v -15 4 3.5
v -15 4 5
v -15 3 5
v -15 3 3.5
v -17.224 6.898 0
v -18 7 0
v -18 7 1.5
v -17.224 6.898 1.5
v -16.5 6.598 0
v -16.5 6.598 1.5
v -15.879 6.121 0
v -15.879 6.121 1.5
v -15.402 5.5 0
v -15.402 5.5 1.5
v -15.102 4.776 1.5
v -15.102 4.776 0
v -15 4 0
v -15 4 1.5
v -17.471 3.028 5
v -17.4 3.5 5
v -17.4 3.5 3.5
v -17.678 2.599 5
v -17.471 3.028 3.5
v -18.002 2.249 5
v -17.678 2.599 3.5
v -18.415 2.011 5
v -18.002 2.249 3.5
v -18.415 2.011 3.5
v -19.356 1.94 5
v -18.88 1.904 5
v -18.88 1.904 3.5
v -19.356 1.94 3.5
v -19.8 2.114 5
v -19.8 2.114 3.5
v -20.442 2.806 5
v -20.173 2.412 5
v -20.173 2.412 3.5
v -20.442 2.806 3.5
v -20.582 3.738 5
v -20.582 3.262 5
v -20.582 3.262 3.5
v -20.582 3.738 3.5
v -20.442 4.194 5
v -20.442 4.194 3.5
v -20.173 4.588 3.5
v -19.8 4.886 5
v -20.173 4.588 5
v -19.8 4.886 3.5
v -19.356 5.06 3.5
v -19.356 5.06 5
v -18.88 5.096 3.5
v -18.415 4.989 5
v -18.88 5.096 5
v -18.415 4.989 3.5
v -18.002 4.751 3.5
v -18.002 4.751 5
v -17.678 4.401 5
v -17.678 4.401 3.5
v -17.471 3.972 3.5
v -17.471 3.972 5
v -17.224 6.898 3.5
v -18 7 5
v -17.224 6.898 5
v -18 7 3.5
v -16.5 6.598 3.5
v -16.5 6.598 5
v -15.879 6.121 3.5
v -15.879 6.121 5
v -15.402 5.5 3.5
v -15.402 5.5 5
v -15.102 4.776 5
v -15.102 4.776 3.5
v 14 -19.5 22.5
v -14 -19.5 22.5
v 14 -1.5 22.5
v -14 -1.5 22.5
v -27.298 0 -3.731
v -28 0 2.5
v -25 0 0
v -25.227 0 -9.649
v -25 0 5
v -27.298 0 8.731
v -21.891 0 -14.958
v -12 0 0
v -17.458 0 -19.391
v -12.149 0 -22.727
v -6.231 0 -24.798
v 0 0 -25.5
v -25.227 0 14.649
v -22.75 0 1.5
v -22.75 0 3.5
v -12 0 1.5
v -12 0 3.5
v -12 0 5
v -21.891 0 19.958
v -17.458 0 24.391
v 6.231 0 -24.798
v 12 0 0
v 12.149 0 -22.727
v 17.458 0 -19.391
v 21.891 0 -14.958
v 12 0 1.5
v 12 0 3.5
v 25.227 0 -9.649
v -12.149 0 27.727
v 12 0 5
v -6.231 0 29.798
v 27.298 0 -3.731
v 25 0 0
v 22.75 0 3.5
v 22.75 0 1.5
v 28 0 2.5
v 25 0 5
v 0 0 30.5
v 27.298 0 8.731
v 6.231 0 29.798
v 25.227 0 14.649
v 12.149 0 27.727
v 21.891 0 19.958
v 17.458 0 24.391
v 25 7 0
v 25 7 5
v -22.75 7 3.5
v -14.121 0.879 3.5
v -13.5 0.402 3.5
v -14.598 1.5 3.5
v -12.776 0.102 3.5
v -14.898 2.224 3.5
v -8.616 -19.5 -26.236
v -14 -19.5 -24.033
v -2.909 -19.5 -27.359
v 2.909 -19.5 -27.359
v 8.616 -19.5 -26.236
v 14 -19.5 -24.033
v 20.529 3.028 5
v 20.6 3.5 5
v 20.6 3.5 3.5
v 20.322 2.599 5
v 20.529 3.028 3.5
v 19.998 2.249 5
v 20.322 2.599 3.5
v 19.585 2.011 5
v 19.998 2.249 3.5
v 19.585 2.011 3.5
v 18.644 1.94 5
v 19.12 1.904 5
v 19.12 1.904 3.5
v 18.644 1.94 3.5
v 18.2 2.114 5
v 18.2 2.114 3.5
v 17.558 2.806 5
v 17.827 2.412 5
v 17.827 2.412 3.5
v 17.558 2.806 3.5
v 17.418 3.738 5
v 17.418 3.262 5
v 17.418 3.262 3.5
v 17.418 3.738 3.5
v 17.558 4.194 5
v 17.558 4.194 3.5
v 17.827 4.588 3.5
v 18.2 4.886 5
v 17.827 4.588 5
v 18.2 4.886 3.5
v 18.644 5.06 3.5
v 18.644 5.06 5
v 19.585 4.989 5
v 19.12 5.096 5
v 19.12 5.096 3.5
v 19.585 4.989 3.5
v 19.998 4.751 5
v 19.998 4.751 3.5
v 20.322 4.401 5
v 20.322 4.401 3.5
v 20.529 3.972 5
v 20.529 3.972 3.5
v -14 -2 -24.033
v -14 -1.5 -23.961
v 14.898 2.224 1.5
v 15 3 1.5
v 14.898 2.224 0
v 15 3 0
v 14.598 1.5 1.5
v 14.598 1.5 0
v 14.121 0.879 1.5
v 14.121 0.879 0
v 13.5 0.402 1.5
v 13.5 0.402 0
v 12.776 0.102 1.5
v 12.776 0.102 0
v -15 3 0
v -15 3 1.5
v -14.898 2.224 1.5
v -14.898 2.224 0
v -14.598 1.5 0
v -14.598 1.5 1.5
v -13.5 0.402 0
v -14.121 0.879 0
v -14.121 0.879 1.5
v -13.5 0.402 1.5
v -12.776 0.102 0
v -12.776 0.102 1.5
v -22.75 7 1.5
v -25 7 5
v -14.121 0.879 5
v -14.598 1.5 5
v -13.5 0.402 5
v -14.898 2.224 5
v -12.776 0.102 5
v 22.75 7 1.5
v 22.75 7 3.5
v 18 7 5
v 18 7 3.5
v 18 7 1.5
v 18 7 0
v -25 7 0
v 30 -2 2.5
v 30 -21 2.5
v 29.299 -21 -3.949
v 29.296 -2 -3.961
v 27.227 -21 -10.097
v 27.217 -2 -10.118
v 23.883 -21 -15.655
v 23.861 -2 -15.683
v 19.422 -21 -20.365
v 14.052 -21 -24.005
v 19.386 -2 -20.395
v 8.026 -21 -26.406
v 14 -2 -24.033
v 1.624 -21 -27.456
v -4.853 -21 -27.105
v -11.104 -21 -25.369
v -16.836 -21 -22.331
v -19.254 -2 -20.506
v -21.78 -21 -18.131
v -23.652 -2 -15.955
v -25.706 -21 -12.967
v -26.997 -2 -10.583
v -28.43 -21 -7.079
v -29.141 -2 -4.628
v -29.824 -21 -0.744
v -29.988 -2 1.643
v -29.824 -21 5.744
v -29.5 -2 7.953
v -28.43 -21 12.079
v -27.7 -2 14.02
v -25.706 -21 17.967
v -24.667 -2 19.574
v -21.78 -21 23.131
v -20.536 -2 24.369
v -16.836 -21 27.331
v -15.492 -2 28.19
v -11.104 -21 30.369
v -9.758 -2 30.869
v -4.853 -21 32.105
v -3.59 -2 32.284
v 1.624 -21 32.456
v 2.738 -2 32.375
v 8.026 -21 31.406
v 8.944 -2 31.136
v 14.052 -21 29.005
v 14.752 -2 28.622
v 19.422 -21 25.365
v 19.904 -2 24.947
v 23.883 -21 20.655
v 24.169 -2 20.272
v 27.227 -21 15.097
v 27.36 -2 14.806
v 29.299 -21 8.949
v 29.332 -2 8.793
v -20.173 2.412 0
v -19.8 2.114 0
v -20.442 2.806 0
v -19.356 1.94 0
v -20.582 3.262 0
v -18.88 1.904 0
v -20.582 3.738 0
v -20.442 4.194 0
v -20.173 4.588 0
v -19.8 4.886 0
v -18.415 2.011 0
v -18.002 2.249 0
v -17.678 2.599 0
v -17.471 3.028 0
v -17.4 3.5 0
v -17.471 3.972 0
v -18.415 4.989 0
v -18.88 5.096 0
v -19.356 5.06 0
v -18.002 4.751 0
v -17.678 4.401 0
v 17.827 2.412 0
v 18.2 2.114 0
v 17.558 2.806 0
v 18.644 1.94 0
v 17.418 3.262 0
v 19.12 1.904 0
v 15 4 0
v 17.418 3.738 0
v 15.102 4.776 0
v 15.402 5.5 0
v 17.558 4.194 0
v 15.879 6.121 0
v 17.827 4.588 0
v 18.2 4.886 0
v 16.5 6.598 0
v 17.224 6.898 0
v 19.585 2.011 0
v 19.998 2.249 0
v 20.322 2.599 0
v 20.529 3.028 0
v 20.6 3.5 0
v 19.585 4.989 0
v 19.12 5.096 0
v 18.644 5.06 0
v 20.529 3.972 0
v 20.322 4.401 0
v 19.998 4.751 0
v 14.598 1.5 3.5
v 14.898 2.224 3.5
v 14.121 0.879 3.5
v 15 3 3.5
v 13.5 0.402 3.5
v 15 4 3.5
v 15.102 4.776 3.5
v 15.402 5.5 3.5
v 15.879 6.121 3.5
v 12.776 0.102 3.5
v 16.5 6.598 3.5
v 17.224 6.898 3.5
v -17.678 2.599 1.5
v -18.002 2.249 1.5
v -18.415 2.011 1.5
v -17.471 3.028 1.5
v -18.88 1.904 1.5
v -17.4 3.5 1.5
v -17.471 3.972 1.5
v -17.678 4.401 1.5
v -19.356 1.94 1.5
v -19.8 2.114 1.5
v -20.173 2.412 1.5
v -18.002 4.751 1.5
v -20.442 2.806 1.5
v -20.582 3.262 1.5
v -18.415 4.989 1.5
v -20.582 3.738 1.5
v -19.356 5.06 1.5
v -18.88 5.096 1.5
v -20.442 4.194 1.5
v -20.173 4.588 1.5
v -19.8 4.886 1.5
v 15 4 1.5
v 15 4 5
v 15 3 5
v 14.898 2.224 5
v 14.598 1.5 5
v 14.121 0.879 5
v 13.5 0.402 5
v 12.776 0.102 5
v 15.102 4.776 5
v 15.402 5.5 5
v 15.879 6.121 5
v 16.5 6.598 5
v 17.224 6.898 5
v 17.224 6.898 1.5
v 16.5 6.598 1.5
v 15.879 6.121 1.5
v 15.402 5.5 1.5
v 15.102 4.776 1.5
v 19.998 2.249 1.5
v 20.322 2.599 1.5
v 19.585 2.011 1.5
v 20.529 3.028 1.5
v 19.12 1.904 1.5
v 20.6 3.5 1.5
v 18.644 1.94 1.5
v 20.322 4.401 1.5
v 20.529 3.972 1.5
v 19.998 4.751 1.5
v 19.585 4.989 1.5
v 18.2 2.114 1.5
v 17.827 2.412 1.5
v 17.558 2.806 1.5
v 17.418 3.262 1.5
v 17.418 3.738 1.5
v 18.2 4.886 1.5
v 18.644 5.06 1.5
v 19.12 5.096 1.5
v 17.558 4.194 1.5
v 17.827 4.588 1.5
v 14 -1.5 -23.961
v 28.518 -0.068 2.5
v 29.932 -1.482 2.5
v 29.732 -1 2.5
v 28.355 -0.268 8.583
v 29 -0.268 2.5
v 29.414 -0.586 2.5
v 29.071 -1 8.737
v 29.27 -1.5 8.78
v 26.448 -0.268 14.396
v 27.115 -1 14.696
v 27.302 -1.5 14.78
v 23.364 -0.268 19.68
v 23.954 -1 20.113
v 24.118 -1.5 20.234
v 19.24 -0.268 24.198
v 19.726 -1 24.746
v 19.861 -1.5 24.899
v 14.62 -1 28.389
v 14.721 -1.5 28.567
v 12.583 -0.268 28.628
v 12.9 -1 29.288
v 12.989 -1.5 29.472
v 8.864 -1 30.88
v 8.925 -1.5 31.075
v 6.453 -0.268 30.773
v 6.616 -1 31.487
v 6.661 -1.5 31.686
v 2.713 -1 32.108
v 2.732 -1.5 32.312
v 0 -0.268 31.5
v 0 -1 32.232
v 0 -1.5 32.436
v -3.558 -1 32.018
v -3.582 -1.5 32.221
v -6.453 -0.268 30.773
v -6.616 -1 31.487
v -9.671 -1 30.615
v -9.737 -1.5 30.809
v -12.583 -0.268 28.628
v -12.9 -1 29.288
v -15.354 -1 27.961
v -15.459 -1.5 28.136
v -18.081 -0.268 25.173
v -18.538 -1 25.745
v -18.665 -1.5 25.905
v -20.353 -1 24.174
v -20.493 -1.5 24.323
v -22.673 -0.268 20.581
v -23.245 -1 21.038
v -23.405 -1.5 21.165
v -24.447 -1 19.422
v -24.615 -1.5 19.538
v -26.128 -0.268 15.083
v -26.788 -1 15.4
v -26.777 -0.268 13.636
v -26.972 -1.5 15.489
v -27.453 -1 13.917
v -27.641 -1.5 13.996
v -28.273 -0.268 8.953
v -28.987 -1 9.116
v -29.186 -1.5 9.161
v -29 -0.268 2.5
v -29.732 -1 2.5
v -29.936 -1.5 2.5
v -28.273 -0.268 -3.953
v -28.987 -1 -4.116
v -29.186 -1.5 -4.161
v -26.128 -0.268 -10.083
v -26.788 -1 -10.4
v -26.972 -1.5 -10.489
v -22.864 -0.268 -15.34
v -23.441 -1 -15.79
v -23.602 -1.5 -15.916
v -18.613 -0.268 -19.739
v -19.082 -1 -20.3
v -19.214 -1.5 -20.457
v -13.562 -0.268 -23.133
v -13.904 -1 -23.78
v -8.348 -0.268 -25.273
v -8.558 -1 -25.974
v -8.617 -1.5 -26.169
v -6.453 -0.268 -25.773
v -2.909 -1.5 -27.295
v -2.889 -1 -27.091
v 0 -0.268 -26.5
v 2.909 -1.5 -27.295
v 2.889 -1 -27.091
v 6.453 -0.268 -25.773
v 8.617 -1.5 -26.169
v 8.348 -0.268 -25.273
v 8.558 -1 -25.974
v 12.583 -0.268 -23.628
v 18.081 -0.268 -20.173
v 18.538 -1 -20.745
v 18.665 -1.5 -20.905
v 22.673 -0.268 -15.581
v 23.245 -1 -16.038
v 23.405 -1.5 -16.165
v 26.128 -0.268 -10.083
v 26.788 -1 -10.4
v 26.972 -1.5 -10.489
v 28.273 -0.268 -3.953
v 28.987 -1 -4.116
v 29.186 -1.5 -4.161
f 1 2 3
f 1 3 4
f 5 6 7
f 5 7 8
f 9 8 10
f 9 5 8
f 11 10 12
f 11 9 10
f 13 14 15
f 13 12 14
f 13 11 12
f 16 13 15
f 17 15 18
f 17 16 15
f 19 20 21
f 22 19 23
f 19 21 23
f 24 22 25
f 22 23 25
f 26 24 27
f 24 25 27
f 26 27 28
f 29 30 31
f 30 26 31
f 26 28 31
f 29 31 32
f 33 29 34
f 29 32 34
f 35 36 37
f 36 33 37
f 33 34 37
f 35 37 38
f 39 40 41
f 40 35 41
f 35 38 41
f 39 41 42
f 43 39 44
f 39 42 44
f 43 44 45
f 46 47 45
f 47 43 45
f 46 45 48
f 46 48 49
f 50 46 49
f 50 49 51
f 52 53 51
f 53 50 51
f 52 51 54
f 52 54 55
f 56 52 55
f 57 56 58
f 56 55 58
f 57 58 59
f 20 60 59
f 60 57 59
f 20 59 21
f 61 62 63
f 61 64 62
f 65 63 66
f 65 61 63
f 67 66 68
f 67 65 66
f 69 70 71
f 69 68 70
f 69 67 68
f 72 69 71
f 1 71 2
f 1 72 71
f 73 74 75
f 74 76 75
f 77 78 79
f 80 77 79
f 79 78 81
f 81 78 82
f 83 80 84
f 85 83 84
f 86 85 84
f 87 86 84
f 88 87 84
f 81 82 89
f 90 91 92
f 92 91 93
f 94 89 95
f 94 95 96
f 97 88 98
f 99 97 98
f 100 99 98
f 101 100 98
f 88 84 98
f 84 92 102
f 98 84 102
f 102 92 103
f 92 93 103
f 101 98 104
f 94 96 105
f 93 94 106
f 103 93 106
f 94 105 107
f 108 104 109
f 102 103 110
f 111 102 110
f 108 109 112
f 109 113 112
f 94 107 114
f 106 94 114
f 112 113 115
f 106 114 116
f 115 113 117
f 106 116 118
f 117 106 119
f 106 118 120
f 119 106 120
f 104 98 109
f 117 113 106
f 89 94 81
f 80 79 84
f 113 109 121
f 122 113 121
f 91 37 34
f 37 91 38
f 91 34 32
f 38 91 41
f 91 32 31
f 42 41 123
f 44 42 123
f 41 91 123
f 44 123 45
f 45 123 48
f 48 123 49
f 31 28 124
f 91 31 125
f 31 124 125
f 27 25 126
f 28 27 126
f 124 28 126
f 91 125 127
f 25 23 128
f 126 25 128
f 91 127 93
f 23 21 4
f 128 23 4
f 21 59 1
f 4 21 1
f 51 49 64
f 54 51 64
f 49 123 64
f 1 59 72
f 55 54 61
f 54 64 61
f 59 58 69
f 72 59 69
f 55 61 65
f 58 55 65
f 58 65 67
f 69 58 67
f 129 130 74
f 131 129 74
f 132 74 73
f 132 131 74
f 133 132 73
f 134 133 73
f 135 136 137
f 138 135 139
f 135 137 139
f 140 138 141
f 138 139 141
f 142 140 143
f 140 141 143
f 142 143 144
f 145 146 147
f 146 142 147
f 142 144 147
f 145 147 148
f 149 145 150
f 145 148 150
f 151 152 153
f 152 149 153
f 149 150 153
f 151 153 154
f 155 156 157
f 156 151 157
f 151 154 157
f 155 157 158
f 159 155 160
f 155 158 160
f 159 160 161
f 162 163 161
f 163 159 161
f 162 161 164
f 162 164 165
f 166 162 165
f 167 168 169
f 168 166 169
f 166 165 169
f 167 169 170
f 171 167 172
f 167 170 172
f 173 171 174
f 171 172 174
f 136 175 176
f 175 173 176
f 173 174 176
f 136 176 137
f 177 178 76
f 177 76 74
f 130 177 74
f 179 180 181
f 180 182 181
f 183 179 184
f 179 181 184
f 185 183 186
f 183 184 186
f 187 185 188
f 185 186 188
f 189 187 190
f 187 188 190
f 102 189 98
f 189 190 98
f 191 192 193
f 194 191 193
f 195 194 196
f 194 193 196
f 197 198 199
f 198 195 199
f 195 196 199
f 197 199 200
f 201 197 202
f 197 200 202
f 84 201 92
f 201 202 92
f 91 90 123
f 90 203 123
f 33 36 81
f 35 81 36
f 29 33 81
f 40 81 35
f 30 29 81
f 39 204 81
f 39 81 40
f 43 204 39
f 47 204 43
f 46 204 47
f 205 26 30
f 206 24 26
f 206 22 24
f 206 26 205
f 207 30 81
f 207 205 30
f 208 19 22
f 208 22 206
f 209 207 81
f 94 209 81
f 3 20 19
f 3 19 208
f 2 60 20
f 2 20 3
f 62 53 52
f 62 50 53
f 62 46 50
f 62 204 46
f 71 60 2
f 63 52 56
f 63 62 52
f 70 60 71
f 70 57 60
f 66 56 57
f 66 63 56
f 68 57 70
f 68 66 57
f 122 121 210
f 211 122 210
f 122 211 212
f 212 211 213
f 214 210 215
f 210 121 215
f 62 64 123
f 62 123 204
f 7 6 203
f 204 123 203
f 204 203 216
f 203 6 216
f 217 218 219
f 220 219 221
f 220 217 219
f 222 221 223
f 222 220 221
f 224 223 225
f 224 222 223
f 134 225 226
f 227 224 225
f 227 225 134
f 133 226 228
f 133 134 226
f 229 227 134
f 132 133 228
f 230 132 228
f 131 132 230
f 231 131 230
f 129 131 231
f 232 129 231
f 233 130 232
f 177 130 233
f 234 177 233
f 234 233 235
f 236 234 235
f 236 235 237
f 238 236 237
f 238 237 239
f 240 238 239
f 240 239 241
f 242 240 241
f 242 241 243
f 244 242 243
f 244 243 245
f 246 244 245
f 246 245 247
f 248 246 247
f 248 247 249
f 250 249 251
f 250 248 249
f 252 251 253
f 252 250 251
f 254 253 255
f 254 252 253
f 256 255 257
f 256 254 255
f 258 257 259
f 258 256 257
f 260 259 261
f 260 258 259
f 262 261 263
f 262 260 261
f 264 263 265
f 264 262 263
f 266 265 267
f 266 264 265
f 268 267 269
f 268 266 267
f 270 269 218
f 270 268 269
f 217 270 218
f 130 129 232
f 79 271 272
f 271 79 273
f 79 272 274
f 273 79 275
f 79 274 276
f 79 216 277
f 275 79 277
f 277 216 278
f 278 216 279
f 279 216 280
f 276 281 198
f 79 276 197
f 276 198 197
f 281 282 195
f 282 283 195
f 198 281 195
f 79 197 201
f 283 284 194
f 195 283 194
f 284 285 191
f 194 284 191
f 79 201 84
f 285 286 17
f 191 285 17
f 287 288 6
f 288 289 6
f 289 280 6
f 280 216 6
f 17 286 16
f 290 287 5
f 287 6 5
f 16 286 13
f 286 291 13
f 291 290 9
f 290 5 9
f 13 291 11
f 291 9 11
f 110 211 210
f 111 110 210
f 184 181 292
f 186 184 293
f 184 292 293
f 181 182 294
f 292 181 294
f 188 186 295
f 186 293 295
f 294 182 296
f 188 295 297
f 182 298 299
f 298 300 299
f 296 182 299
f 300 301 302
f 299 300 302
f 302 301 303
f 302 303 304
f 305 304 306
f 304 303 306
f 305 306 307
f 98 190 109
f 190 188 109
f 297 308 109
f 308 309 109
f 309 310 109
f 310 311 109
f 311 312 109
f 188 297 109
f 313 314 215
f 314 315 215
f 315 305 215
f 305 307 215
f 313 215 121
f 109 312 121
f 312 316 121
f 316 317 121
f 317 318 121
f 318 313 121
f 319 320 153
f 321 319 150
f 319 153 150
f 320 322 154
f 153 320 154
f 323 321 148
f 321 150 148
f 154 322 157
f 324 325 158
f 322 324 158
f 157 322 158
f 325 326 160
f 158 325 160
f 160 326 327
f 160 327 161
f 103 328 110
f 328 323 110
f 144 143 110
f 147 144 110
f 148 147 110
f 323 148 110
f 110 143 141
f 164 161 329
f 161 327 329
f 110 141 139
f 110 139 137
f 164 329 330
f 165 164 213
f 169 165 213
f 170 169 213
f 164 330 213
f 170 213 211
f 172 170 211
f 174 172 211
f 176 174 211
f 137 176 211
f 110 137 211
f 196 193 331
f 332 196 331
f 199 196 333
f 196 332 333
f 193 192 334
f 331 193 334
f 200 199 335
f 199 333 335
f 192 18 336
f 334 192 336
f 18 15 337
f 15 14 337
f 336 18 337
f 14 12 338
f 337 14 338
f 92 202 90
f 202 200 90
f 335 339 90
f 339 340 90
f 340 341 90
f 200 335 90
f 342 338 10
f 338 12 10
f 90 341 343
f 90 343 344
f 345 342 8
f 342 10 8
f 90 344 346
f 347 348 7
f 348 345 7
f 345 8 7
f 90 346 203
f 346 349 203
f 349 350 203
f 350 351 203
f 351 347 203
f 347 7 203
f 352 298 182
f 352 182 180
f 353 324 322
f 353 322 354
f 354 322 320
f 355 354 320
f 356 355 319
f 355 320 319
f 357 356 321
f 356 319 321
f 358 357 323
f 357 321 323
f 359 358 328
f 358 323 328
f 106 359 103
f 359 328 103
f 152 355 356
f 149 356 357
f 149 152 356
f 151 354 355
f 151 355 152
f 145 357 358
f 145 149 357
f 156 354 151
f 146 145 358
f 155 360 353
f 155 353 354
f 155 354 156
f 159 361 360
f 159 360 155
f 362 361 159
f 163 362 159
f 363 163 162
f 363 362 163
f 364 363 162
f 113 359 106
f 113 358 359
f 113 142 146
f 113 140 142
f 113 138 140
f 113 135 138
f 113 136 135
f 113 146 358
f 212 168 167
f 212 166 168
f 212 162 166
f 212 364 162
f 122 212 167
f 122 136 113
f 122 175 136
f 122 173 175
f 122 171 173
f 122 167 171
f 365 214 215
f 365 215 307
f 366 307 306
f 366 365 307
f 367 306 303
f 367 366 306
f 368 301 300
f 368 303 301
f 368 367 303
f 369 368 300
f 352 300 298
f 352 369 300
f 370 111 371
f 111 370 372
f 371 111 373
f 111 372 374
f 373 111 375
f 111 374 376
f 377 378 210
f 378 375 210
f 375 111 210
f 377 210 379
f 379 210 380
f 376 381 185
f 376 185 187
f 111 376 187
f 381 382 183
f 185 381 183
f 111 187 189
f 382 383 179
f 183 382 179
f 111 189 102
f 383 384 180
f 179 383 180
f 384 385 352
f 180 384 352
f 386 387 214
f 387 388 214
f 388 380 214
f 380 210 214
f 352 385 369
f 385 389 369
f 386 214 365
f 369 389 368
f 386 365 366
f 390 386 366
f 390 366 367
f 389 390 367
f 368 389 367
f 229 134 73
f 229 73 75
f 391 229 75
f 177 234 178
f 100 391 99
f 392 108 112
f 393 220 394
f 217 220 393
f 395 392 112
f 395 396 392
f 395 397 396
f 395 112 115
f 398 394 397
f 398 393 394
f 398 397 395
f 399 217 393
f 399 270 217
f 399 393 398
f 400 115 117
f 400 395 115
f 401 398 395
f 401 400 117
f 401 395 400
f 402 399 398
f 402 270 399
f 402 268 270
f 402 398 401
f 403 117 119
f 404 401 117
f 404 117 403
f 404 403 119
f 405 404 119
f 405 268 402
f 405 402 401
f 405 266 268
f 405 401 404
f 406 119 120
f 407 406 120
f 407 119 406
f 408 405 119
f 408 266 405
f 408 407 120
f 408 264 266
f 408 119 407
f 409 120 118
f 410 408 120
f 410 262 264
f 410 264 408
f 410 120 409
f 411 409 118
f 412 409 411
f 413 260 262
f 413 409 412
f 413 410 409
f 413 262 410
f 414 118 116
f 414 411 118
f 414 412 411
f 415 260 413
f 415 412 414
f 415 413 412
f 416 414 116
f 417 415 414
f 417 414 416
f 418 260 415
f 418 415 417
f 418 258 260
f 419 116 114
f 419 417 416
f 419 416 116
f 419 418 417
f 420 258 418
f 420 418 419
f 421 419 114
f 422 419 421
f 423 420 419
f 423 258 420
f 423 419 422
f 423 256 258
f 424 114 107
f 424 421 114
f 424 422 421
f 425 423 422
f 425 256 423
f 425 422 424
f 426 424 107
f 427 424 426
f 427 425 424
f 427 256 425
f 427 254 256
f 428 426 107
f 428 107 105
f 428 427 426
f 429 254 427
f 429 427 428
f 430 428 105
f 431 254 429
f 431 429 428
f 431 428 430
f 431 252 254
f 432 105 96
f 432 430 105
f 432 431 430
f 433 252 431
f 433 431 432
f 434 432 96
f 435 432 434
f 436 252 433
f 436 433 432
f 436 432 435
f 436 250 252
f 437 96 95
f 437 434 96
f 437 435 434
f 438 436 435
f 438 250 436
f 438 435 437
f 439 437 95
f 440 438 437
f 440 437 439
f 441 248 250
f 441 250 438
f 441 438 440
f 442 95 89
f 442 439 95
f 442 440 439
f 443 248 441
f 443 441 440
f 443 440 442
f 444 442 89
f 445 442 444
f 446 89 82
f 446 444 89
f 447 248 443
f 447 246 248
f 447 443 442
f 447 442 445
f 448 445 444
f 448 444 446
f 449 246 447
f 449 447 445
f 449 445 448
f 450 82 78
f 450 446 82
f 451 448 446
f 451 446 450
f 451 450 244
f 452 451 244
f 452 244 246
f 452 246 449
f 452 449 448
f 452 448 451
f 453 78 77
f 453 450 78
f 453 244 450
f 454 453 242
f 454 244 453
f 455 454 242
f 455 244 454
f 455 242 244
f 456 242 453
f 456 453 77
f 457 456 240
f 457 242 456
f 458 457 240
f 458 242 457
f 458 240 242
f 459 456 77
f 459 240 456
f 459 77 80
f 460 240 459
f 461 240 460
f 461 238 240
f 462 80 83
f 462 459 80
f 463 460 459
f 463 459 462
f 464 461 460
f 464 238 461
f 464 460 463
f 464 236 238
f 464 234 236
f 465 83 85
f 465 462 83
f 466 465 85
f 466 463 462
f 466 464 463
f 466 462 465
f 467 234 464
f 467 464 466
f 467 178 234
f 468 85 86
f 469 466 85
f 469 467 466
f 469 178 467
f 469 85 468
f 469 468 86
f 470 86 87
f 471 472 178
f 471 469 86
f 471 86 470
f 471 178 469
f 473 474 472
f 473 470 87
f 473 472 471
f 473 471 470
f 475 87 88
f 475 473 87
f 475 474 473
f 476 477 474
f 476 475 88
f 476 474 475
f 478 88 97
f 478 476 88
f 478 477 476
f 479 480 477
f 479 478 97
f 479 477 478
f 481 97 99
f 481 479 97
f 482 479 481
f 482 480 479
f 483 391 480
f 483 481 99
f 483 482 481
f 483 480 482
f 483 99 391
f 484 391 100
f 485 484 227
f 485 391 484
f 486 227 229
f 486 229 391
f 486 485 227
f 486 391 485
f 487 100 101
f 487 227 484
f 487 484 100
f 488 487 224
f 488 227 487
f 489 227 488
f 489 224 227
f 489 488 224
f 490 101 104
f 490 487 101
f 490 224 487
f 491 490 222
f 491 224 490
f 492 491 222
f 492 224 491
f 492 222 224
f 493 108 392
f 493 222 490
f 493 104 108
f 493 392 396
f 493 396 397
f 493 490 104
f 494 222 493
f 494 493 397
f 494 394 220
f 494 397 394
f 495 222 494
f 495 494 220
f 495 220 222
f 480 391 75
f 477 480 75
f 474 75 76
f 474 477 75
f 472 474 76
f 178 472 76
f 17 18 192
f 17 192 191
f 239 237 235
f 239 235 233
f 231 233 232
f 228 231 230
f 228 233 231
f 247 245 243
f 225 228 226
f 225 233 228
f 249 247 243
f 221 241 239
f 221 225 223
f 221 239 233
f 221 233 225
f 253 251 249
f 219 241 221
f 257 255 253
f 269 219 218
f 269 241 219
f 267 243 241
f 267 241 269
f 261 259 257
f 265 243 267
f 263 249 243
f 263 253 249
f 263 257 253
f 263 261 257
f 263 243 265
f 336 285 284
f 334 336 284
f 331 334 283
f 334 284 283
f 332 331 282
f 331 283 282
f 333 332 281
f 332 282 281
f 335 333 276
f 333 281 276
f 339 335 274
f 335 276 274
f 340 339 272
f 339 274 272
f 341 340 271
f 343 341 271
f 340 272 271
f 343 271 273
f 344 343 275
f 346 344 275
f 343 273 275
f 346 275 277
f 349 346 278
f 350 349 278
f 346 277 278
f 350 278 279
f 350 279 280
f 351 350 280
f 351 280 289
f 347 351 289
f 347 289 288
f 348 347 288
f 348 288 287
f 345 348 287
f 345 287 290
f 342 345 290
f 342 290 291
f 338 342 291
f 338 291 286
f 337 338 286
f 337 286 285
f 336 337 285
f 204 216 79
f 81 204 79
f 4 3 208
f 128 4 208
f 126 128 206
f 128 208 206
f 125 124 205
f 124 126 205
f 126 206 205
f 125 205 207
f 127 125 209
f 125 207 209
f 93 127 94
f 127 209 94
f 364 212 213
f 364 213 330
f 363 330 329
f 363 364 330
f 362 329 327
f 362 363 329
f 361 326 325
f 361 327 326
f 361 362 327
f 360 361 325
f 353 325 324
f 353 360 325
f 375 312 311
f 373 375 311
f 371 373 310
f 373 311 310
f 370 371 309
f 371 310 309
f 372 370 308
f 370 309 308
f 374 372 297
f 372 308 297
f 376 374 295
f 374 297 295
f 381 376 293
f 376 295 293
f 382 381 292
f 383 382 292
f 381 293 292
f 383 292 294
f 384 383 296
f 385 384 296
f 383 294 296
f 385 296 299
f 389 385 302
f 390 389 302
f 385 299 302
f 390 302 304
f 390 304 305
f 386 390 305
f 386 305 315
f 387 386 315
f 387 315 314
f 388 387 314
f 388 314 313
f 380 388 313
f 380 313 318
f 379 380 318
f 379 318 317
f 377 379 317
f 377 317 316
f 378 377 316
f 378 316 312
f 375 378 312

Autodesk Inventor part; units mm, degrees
ref_plane "Work Plane2" through (0, 0, 32.5) normal (0, 0, 1) x (1, 0, 0)
ref_plane "YZ Plane" through (0, 0, 0) normal (1, 0, 0) x (0, 1, 0)
sketch "Sketch1" plane through (0, 0, 0) normal (0, 0, 1) x (1, 0, 0)
  line L0 (25, 7) -> (-25, 7)
  line L1 (-25, 7) -> (-25, 0)
  line L2 (-25, 0) -> (25, 0)
  line L3 (25, 0) -> (25, 7)
  circle A0 centre (-19, 3.5) radius 1.6
  circle A1 centre (19, 3.5) radius 1.6
  line L4 (19, 3.5) -> (-19, 3.5) construction
  line L5 (19, 3.5) -> (25, 7) construction
  line L6 (19, 3.5) -> (25, 0) construction
  line L7 (-19, 3.5) -> (-25, 7) construction
  line L8 (-19, 3.5) -> (-25, 0) construction
  line L9 (0, 0) -> (-19, 3.5) construction
  line L10 (0, 0) -> (19, 3.5) construction
  dimension "d0" = 3.2
  dimension "d1" = 38
  dimension "d2" = 7
  dimension "d3" = 50
extrude "Extrusion1" add sketch "Sketch1" along normal blind 5
sketch "Sketch2" plane through (-25, 7, 0) normal (0, 1, 0) x (1, 0, 0)
  line L0 (2.25, -3.5) -> (10, -3.5)
  line L1 (47.75, -3.5) -> (47.75, -1.5)
  line L2 (47.75, -1.5) -> (40, -1.5)
  line L3 (2.25, -1.5) -> (2.25, -3.5)
  line L4 (50, -5) -> (0, -5) construction
  line L5 (0, -5) -> (2.25, -3.5) construction
  line L6 (50, 0) -> (0, 0) construction
  line L7 (2.25, -1.5) -> (0, 0) construction
  line L8 (50, 0) -> (50, -5) construction
  line L9 (47.75, -3.5) -> (50, -5) construction
  line L10 (40, -3.5) -> (40, -5)
  line L11 (40, -5) -> (10, -5)
  line L12 (10, -5) -> (10, -3.5)
  line L13 (10, -1.5) -> (10, 0)
  line L14 (10, 0) -> (40, 0)
  line L15 (40, 0) -> (40, -1.5)
  line L16 (40, -3.5) -> (47.75, -3.5)
  line L17 (40, -1.5) -> (10, -1.5) construction
  line L18 (10, -3.5) -> (40, -3.5) construction
  line L19 (10, -1.5) -> (2.25, -1.5)
  line L20 (47.75, -3.5) -> (40, -5) construction
  line L21 (40, 0) -> (47.75, -1.5) construction
  line L22 (10, -5) -> (2.25, -3.5) construction
  line L23 (2.25, -1.5) -> (10, 0) construction
  point P0 (25, 0)
  dimension "d6" = 45.5
  dimension "d7" = 2
  dimension "d13" = 30
extrude "Extrusion2" cut sketch "Sketch2" against normal up to next
sketch "Sketch3" plane through (-25, 0, 0) normal (0, -1, 0) x (1, 0, 0)
  circle A0 centre (25, 2.5) radius 30
  line L0 (0, 5) -> (50, 5) construction
  line L1 (0, 5) -> (25, 2.5) construction
  line L2 (0, 0) -> (50, 0) construction
  line L3 (25, 2.5) -> (0, 0) construction
  line L4 (25, 2.5) -> (50, 5) construction
  point P0 (25, 0)
  dimension "d10" = 60
extrude "Extrusion3" add sketch "Sketch3" along normal blind 21
ref_plane "Work Plane1" through (0, 0, -27.5) normal (0, 0, 1) x (1, 0, 0)
sketch "Sketch5" plane through (0, 0, -27.5) normal (0, 0, 1) x (1, 0, 0)
  line L0 (14, -1.5) -> (-14, -1.5)
  line L1 (-14, -1.5) -> (-14, -19.5)
  line L2 (-14, -19.5) -> (14, -19.5)
  line L3 (14, -19.5) -> (14, -1.5)
  line L4 (-30, -21) -> (30, -21) construction
  line L5 (30, 0) -> (-30, 0) construction
  line L6 (30, 0) -> (-30, 0) construction
  line L7 (30, 0) -> (14, -1.5) construction
  line L8 (-14, -1.5) -> (-30, 0) construction
  line L9 (-30, -21) -> (30, -21) construction
  line L10 (-30, -21) -> (-14, -19.5) construction
  point P0 (0, 0)
  dimension "d16" = 18
  dimension "d17" = 28
extrude "Extrusion4" cut sketch "Sketch5" along normal blind 50
fillet "Fillet1" radius 3 8 edges at (15, 7, 0.75) (15, 7, 4.25) (15, 0, 4.25) (15, 0, 0.75) (-15, 0, 0.75) (-15, 7, 0.75) (-15, 7, 4.25) (-15, 0, 4.25)
fillet "Fillet2" radius 2 1 edges at (-30, 0, 2.5)
sketch "Sketch7" plane through (0, 0, 32.5) normal (0, 0, 1) x (1, 0, 0)
  spline S0 degree 3 poles (3.6755, -17.8887) (1.3417, -19.2361) (-1.5336, -19.2361) (-3.8674, -17.8887) knots 0 0 0 0 1 1 1 1
  line L0 (3.6755, -17.8887) -> (1.3417, -19.2361) construction
  line L1 (1.3417, -19.2361) -> (-1.5336, -19.2361) construction
  line L2 (-1.5336, -19.2361) -> (-3.8674, -17.8887) construction
  spline S1 degree 3 poles (-3.8674, -17.8887) (-6.2011, -16.5413) (-7.6388, -14.0512) (-7.6388, -11.3564) knots 0 0 0 0 1 1 1 1
  line L3 (-3.8674, -17.8887) -> (-6.2011, -16.5413) construction
  line L4 (-6.2011, -16.5413) -> (-7.6388, -14.0512) construction
  line L5 (-7.6388, -14.0512) -> (-7.6388, -11.3564) construction
  spline S2 degree 3 poles (-7.6388, -11.3564) (-7.6388, -8.6616) (-6.2011, -6.1715) (-3.8674, -4.8241) knots 0 0 0 0 1 1 1 1
  line L6 (-7.6388, -11.3564) -> (-7.6388, -8.6616) construction
  line L7 (-7.6388, -8.6616) -> (-6.2011, -6.1715) construction
  line L8 (-6.2011, -6.1715) -> (-3.8674, -4.8241) construction
  spline S3 degree 3 poles (-3.8674, -4.8241) (-1.5336, -3.4767) (1.3417, -3.4767) (3.6755, -4.8241) knots 0 0 0 0 1 1 1 1
  line L9 (-3.8674, -4.8241) -> (-1.5336, -3.4767) construction
  line L10 (-1.5336, -3.4767) -> (1.3417, -3.4767) construction
  line L11 (1.3417, -3.4767) -> (3.6755, -4.8241) construction
  spline S4 degree 3 poles (3.6755, -4.8241) (6.0092, -6.1715) (7.4469, -8.6616) (7.4469, -11.3564) knots 0 0 0 0 1 1 1 1
  line L12 (3.6755, -4.8241) -> (6.0092, -6.1715) construction
  line L13 (6.0092, -6.1715) -> (7.4469, -8.6616) construction
  line L14 (7.4469, -8.6616) -> (7.4469, -11.3564) construction
  spline S5 degree 3 poles (7.4469, -11.3564) (7.4469, -14.0512) (6.0092, -16.5413) (3.6755, -17.8887) knots 0 0 0 0 1 1 1 1
  line L15 (7.4469, -11.3564) -> (7.4469, -14.0512) construction
  line L16 (7.4469, -14.0512) -> (6.0092, -16.5413) construction
  line L17 (6.0092, -16.5413) -> (3.6755, -17.8887) construction
  spline S6 degree 3 poles (-0.623, -14.5187) (-0.623, -14.5201) (-0.623, -15.9241) (-2.0285, -15.9241) knots 0 0 0 0 1 1 1 1
  line L18 (-0.623, -14.5187) -> (-0.623, -14.5187) construction
  line L19 (-0.623, -14.5187) -> (-0.623, -15.9241) construction
  line L20 (-0.623, -15.9241) -> (-2.0285, -15.9241) construction
  spline S7 degree 3 poles (-2.0285, -15.9241) (-3.4339, -15.9241) (-3.4339, -14.5201) (-3.4339, -14.5187) knots 0 0 0 0 1 1 1 1
  line L21 (-2.0285, -15.9241) -> (-3.4339, -15.9241) construction
  line L22 (-3.4339, -15.9241) -> (-3.4339, -14.5187) construction
  line L23 (-3.4339, -14.5187) -> (-3.4339, -14.5187) construction
  line L24 (-0.623, -5.7345) -> (-0.623, -14.5187)
  spline S8 degree 3 poles (-4.488, -14.5187) (-4.488, -14.5211) (-4.488, -16.9782) (-2.0285, -16.9782) knots 0 0 0 0 1 1 1 1
  line L25 (-4.488, -14.5187) -> (-4.488, -14.5187) construction
  line L26 (-4.488, -14.5187) -> (-4.488, -16.9782) construction
  line L27 (-4.488, -16.9782) -> (-2.0285, -16.9782) construction
  spline S9 degree 3 poles (-2.0285, -16.9782) (0.4311, -16.9782) (0.4311, -14.5211) (0.4311, -14.5187) knots 0 0 0 0 1 1 1 1
  line L28 (-2.0285, -16.9782) -> (0.4311, -16.9782) construction
  line L29 (0.4311, -16.9782) -> (0.4311, -14.5187) construction
  line L30 (0.4311, -14.5187) -> (0.4311, -14.5187) construction
  line L31 (-3.4339, -14.5187) -> (-4.488, -14.5187)
  spline S10 degree 3 poles (1.8366, -14.5187) (1.839, -14.5187) (4.2961, -14.5187) (4.2961, -12.0591) knots 0 0 0 0 1 1 1 1
  line L32 (1.8366, -14.5187) -> (1.8366, -14.5187) construction
  line L33 (1.8366, -14.5187) -> (4.2961, -14.5187) construction
  line L34 (4.2961, -14.5187) -> (4.2961, -12.0591) construction
  spline S11 degree 3 poles (4.2961, -12.0591) (4.2961, -11.0712) (3.8992, -10.4803) (3.4243, -10.1266) knots 0 0 0 0 1 1 1 1
  line L35 (4.2961, -12.0591) -> (4.2961, -11.0712) construction
  line L36 (4.2961, -11.0712) -> (3.8992, -10.4803) construction
  line L37 (3.8992, -10.4803) -> (3.4243, -10.1266) construction
  spline S12 degree 3 poles (3.4243, -10.1266) (3.8992, -9.7729) (4.2961, -9.182) (4.2961, -8.1941) knots 0 0 0 0 1 1 1 1
  line L38 (3.4243, -10.1266) -> (3.8992, -9.7729) construction
  line L39 (3.8992, -9.7729) -> (4.2961, -9.182) construction
  line L40 (4.2961, -9.182) -> (4.2961, -8.1941) construction
  spline S13 degree 3 poles (4.2961, -8.1941) (4.2961, -5.7345) (1.839, -5.7345) (1.8366, -5.7345) knots 0 0 0 0 1 1 1 1
  line L41 (4.2961, -8.1941) -> (4.2961, -5.7345) construction
  line L42 (4.2961, -5.7345) -> (1.8366, -5.7345) construction
  line L43 (1.8366, -5.7345) -> (1.8366, -5.7345) construction
  line L44 (0.4311, -14.5187) -> (1.8366, -14.5187)
  line L45 (1.8366, -5.7345) -> (-0.623, -5.7345)
  spline S14 degree 3 poles (1.8366, -6.7886) (1.838, -6.7886) (3.242, -6.7886) (3.242, -8.1941) knots 0 0 0 0 1 1 1 1
  line L46 (1.8366, -6.7886) -> (1.8366, -6.7886) construction
  line L47 (1.8366, -6.7886) -> (3.242, -6.7886) construction
  line L48 (3.242, -6.7886) -> (3.242, -8.1941) construction
  spline S15 degree 3 poles (3.242, -8.1941) (3.242, -9.5995) (1.838, -9.5995) (1.8366, -9.5995) knots 0 0 0 0 1 1 1 1
  line L49 (3.242, -8.1941) -> (3.242, -9.5995) construction
  line L50 (3.242, -9.5995) -> (1.8366, -9.5995) construction
  line L51 (1.8366, -9.5995) -> (1.8366, -9.5995) construction
  line L52 (0.4311, -6.7886) -> (1.8366, -6.7886)
  line L53 (1.8366, -9.5995) -> (0.4311, -9.5995)
  line L54 (0.4311, -9.5995) -> (0.4311, -6.7886)
  spline S16 degree 3 poles (1.8366, -10.6536) (1.838, -10.6536) (3.242, -10.6536) (3.242, -12.0591) knots 0 0 0 0 1 1 1 1
  line L55 (1.8366, -10.6536) -> (1.8366, -10.6536) construction
  line L56 (1.8366, -10.6536) -> (3.242, -10.6536) construction
  line L57 (3.242, -10.6536) -> (3.242, -12.0591) construction
  spline S17 degree 3 poles (3.242, -12.0591) (3.242, -13.4646) (1.838, -13.4646) (1.8366, -13.4646) knots 0 0 0 0 1 1 1 1
  line L58 (3.242, -12.0591) -> (3.242, -13.4646) construction
  line L59 (3.242, -13.4646) -> (1.8366, -13.4646) construction
  line L60 (1.8366, -13.4646) -> (1.8366, -13.4646) construction
  line L61 (0.4311, -10.6536) -> (1.8366, -10.6536)
  line L62 (1.8366, -13.4646) -> (0.4311, -13.4646)
  line L63 (0.4311, -13.4646) -> (0.4311, -10.6536)
  point P0 (0, 0)
properties part number "Base with 9V Batt"
